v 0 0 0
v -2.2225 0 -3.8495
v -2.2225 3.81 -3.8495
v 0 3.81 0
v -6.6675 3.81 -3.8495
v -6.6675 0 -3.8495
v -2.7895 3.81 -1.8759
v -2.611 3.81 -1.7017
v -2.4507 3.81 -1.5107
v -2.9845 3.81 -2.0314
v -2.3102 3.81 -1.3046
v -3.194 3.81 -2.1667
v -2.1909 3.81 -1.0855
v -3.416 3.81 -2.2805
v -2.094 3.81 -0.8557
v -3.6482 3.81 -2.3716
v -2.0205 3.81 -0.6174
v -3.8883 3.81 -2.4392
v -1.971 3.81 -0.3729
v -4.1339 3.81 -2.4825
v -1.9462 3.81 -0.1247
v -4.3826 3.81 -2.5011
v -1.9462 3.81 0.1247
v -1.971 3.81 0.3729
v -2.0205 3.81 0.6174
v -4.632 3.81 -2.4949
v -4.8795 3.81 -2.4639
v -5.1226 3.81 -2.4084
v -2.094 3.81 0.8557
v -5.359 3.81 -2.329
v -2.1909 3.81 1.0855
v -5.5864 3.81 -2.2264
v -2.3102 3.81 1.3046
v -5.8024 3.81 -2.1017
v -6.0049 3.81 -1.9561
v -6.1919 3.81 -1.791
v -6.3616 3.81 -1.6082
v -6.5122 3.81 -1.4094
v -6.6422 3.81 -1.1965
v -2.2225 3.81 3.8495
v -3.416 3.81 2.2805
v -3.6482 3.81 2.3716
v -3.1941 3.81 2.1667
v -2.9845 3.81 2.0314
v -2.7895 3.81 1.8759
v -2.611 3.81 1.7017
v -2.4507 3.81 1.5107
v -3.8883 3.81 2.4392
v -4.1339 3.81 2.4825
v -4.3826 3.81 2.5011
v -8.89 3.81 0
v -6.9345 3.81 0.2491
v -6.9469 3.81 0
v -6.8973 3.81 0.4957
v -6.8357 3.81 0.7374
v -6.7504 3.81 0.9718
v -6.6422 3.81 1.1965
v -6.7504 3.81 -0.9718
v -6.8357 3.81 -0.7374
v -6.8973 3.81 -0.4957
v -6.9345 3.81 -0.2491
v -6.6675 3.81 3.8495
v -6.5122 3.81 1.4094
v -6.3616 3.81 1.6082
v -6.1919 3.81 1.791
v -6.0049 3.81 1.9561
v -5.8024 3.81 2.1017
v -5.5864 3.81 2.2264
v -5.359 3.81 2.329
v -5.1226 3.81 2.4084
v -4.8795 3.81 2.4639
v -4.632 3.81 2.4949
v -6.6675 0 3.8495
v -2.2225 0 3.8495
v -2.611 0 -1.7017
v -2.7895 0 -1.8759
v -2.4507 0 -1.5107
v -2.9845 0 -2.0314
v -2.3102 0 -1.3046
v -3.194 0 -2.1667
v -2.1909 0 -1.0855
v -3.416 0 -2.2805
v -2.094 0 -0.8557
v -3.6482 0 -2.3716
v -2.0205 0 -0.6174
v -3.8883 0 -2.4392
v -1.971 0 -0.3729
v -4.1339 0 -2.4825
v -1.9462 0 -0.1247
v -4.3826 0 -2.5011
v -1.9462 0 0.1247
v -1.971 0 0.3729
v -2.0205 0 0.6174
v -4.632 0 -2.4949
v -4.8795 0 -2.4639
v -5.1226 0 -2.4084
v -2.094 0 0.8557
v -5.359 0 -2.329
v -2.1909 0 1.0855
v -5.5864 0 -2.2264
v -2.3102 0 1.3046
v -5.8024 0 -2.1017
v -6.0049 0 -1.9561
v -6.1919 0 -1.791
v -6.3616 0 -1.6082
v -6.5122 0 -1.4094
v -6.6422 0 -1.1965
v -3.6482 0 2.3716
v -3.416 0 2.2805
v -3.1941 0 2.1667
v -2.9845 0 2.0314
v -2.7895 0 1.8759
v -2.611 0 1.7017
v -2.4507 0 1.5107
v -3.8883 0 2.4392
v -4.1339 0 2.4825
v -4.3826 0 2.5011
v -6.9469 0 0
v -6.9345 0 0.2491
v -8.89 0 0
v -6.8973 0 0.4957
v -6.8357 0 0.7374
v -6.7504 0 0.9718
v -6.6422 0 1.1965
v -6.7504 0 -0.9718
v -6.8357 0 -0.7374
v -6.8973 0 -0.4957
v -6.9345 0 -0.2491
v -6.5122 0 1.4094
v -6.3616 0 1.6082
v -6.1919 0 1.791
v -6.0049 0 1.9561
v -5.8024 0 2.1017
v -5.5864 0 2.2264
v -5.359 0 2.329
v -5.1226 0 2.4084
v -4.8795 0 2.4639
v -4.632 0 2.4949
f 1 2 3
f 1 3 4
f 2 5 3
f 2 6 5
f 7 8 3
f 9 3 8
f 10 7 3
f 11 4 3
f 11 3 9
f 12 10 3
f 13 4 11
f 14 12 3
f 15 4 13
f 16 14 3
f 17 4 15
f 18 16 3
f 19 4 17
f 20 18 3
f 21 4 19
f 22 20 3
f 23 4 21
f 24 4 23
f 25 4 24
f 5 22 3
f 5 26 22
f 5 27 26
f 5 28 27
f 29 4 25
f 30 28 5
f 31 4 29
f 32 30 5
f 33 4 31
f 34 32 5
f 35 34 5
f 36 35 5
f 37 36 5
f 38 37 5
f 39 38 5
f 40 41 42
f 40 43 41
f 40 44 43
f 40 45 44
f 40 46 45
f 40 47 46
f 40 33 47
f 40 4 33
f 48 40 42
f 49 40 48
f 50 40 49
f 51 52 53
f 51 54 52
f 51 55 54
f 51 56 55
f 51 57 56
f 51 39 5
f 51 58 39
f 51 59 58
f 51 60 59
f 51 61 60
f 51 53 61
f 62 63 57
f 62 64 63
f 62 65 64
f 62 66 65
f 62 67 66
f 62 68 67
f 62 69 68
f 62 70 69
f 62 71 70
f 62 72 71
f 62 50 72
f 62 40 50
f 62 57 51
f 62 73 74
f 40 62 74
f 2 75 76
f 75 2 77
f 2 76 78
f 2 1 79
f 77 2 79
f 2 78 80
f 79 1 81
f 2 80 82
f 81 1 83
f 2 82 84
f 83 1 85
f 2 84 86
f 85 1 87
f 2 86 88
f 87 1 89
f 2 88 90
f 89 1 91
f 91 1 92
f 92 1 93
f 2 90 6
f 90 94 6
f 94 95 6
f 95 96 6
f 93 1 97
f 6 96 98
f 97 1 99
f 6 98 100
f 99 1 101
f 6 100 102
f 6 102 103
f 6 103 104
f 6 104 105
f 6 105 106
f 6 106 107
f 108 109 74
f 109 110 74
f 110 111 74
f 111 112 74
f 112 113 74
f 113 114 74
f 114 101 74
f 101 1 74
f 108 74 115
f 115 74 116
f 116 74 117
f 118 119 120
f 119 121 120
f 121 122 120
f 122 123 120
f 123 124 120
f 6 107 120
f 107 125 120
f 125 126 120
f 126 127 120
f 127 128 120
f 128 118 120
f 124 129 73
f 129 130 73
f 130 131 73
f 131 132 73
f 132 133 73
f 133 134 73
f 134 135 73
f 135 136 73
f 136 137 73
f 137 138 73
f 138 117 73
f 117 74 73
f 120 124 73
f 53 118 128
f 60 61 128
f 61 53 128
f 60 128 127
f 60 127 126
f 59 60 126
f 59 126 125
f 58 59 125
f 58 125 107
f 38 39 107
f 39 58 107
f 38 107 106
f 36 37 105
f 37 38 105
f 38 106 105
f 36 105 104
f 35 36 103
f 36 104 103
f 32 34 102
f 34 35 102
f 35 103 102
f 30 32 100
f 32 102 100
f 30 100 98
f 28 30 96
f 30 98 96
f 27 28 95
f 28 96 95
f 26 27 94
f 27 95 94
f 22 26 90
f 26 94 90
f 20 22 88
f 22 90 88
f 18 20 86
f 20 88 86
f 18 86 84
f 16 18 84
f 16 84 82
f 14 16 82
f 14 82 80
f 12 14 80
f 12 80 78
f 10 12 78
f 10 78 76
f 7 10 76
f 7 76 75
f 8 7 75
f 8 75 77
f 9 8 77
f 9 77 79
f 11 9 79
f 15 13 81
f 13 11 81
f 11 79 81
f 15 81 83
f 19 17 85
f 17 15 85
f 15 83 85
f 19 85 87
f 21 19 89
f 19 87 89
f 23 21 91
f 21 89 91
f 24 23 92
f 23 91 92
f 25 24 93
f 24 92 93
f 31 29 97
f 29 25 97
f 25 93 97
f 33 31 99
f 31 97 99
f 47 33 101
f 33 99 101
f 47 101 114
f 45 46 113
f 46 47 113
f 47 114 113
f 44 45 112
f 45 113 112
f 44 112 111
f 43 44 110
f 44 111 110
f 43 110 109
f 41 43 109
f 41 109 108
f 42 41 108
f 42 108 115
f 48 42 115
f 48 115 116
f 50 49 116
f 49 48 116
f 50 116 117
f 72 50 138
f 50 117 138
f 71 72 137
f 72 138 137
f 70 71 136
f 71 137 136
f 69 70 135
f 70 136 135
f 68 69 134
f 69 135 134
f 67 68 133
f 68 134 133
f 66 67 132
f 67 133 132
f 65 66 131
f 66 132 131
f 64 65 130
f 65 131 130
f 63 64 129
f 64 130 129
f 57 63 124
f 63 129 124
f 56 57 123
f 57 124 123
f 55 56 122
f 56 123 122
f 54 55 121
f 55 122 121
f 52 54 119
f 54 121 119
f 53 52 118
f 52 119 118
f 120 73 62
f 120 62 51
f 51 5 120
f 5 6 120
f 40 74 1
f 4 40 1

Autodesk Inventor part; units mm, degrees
ref_plane "YZ Plane" through (0, 0, 0) normal (1, 0, 0) x (0, 1, 0)
ref_plane "XZ Plane" through (0, 0, 0) normal (0, 1, 0) x (-1, 0, 0)
ref_plane "XY Plane" through (0, 0, 0) normal (0, 0, 1) x (1, 0, 0)
sketch "Sketch1" plane through (0, 0, 0) normal (0, 1, 0) x (-1, 0, 0)
  line L0 (6.6675, -3.8495) -> (8.89, 0)
  line L1 (6.6675, -3.8495) -> (2.2225, -3.8495)
  line L2 (2.2225, -3.8495) -> (0, 0)
  line L3 (6.6675, 3.8495) -> (8.89, 0)
  line L4 (6.6675, 3.8495) -> (2.2225, 3.8495)
  line L5 (2.2225, 3.8495) -> (0, 0)
  circle A0 centre (4.445, 0) radius 2.5019
  dimension "d5" = 5.0038
extrude "Extrusion1" add sketch "Sketch1" along normal blind 3.81
thread "Thread1" size "12-24 UNC" class "2B" standard "ANSI Unified Screw Threads" full length
properties part number "nut"
